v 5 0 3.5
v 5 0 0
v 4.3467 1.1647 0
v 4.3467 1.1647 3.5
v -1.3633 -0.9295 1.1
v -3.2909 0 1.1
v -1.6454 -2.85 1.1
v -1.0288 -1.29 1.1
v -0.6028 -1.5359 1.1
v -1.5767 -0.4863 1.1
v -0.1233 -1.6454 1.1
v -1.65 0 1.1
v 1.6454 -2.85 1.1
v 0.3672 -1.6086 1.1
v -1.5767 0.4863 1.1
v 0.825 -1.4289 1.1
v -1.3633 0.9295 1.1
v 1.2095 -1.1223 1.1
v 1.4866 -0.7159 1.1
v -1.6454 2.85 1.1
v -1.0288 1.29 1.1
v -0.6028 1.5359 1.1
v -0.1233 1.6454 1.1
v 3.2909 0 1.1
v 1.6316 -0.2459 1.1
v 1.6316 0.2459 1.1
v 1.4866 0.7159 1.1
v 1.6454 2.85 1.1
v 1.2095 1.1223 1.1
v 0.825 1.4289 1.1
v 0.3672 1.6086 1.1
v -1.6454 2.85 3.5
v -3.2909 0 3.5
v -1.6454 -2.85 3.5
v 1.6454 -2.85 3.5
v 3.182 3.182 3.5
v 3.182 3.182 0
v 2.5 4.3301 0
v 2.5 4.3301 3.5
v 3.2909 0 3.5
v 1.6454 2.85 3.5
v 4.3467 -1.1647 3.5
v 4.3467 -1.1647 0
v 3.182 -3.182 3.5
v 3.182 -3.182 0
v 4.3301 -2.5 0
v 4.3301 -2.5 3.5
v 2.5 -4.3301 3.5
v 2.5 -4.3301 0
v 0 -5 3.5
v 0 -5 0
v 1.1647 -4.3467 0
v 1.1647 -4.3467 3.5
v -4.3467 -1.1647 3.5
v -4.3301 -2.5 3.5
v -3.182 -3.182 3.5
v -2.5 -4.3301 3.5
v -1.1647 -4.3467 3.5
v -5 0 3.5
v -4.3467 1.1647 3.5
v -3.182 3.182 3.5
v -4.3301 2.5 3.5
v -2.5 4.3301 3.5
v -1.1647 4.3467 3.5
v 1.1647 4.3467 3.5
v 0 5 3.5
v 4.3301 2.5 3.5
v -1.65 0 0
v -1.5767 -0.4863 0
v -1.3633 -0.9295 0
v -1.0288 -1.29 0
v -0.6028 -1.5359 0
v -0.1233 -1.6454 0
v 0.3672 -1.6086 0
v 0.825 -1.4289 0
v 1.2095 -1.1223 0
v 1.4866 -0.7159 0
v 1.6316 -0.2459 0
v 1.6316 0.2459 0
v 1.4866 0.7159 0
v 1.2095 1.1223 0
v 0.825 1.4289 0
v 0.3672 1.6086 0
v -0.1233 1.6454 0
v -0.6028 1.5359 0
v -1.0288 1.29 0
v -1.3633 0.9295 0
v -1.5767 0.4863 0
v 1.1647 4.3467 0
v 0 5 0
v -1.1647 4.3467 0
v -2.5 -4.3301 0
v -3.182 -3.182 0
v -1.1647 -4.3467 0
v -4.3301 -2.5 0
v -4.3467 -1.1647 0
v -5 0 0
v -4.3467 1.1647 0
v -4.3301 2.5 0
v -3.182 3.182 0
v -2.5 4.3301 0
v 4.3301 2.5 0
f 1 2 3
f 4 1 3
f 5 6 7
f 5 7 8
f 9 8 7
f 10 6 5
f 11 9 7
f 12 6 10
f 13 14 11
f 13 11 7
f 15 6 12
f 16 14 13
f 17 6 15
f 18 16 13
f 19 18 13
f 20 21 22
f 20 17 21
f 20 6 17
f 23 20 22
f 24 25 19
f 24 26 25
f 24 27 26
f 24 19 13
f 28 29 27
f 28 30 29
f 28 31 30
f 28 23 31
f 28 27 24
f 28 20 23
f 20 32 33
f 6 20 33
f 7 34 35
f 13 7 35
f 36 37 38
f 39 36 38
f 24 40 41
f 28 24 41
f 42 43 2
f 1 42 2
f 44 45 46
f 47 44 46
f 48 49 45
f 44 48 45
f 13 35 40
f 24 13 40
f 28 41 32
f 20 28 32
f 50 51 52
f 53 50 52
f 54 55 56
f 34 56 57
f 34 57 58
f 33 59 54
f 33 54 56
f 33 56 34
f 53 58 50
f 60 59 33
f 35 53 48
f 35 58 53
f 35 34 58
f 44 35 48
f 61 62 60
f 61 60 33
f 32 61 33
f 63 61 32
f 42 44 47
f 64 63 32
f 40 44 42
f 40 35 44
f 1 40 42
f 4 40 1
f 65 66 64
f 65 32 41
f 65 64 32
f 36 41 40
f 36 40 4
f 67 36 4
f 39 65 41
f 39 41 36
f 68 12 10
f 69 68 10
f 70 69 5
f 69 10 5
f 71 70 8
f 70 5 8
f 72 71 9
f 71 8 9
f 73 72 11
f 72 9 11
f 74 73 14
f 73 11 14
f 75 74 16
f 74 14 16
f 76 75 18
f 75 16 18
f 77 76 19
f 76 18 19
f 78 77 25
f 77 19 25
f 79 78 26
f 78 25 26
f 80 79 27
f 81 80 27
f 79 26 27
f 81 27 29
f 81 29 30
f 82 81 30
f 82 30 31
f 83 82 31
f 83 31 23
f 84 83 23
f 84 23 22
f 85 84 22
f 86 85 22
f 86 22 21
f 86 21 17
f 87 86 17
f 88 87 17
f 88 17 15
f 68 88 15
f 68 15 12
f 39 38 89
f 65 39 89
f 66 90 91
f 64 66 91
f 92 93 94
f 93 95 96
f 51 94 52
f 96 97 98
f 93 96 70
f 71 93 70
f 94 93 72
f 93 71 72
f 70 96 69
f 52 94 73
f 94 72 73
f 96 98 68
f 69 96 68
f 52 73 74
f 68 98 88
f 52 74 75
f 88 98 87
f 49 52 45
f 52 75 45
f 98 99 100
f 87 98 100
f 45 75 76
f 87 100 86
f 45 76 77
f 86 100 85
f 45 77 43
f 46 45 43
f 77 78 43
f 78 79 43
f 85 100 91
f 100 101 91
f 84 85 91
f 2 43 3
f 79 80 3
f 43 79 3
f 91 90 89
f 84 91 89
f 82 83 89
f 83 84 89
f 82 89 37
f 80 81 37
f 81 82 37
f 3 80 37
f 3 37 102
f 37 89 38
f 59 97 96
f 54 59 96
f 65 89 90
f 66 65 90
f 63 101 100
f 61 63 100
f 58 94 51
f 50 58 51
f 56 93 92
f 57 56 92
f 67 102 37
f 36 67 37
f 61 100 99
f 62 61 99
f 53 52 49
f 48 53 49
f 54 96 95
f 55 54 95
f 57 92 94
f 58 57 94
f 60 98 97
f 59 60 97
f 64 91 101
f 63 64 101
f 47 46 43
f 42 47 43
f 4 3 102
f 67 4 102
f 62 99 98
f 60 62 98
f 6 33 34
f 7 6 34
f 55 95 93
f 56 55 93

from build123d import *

# Parameters (mm, degrees)
F1_DEPTH = 3.5
F3_DEPTH = 2.4
F4_D     = 3.3


with BuildPart() as f1:
    # F0 (on Top) → F1 (new body)
    with BuildSketch(Plane.XY):
        Polygon((0, 5), (-1.164685703, 4.3466662183), (-2.5, 4.3301270189), (-3.1819805153, 3.1819805153), (-4.3301270189, 2.5), (-4.3466662183, 1.164685703), (-5, 0), (-4.3466662183, -1.164685703), (-4.3301270189, -2.5), (-3.1819805153, -3.1819805153), (-2.5, -4.3301270189), (-1.164685703, -4.3466662183), (0, -5), (1.164685703, -4.3466662183), (2.5, -4.3301270189), (3.1819805153, -3.1819805153), (4.3301270189, -2.5), (4.3466662183, -1.164685703), (5, 0), (4.3466662183, 1.164685703), (4.3301270189, 2.5), (3.1819805153, 3.1819805153), (2.5, 4.3301270189), (1.164685703, 4.3466662183), align=None)
    extrude(amount=F1_DEPTH)

    # F2 (on face) → F3 (cut)
    with BuildSketch(Plane.XY.offset(3.5)):
        Polygon((-1.6454482672, -2.85), (1.6454482672, -2.85), (3.2908965344, 0), (1.6454482672, 2.85), (-1.6454482672, 2.85), (-3.2908965344, 0), align=None)
    extrude(amount=-F3_DEPTH, mode=Mode.SUBTRACT)

    # F4 (through all)
    with Locations(Plane(origin=(0, 0, 0), x_dir=(1, 0, 0), z_dir=(0, 0, -1))):
        with Locations((0, 0)):
            Hole(F4_D / 2)


solid = f1.part
